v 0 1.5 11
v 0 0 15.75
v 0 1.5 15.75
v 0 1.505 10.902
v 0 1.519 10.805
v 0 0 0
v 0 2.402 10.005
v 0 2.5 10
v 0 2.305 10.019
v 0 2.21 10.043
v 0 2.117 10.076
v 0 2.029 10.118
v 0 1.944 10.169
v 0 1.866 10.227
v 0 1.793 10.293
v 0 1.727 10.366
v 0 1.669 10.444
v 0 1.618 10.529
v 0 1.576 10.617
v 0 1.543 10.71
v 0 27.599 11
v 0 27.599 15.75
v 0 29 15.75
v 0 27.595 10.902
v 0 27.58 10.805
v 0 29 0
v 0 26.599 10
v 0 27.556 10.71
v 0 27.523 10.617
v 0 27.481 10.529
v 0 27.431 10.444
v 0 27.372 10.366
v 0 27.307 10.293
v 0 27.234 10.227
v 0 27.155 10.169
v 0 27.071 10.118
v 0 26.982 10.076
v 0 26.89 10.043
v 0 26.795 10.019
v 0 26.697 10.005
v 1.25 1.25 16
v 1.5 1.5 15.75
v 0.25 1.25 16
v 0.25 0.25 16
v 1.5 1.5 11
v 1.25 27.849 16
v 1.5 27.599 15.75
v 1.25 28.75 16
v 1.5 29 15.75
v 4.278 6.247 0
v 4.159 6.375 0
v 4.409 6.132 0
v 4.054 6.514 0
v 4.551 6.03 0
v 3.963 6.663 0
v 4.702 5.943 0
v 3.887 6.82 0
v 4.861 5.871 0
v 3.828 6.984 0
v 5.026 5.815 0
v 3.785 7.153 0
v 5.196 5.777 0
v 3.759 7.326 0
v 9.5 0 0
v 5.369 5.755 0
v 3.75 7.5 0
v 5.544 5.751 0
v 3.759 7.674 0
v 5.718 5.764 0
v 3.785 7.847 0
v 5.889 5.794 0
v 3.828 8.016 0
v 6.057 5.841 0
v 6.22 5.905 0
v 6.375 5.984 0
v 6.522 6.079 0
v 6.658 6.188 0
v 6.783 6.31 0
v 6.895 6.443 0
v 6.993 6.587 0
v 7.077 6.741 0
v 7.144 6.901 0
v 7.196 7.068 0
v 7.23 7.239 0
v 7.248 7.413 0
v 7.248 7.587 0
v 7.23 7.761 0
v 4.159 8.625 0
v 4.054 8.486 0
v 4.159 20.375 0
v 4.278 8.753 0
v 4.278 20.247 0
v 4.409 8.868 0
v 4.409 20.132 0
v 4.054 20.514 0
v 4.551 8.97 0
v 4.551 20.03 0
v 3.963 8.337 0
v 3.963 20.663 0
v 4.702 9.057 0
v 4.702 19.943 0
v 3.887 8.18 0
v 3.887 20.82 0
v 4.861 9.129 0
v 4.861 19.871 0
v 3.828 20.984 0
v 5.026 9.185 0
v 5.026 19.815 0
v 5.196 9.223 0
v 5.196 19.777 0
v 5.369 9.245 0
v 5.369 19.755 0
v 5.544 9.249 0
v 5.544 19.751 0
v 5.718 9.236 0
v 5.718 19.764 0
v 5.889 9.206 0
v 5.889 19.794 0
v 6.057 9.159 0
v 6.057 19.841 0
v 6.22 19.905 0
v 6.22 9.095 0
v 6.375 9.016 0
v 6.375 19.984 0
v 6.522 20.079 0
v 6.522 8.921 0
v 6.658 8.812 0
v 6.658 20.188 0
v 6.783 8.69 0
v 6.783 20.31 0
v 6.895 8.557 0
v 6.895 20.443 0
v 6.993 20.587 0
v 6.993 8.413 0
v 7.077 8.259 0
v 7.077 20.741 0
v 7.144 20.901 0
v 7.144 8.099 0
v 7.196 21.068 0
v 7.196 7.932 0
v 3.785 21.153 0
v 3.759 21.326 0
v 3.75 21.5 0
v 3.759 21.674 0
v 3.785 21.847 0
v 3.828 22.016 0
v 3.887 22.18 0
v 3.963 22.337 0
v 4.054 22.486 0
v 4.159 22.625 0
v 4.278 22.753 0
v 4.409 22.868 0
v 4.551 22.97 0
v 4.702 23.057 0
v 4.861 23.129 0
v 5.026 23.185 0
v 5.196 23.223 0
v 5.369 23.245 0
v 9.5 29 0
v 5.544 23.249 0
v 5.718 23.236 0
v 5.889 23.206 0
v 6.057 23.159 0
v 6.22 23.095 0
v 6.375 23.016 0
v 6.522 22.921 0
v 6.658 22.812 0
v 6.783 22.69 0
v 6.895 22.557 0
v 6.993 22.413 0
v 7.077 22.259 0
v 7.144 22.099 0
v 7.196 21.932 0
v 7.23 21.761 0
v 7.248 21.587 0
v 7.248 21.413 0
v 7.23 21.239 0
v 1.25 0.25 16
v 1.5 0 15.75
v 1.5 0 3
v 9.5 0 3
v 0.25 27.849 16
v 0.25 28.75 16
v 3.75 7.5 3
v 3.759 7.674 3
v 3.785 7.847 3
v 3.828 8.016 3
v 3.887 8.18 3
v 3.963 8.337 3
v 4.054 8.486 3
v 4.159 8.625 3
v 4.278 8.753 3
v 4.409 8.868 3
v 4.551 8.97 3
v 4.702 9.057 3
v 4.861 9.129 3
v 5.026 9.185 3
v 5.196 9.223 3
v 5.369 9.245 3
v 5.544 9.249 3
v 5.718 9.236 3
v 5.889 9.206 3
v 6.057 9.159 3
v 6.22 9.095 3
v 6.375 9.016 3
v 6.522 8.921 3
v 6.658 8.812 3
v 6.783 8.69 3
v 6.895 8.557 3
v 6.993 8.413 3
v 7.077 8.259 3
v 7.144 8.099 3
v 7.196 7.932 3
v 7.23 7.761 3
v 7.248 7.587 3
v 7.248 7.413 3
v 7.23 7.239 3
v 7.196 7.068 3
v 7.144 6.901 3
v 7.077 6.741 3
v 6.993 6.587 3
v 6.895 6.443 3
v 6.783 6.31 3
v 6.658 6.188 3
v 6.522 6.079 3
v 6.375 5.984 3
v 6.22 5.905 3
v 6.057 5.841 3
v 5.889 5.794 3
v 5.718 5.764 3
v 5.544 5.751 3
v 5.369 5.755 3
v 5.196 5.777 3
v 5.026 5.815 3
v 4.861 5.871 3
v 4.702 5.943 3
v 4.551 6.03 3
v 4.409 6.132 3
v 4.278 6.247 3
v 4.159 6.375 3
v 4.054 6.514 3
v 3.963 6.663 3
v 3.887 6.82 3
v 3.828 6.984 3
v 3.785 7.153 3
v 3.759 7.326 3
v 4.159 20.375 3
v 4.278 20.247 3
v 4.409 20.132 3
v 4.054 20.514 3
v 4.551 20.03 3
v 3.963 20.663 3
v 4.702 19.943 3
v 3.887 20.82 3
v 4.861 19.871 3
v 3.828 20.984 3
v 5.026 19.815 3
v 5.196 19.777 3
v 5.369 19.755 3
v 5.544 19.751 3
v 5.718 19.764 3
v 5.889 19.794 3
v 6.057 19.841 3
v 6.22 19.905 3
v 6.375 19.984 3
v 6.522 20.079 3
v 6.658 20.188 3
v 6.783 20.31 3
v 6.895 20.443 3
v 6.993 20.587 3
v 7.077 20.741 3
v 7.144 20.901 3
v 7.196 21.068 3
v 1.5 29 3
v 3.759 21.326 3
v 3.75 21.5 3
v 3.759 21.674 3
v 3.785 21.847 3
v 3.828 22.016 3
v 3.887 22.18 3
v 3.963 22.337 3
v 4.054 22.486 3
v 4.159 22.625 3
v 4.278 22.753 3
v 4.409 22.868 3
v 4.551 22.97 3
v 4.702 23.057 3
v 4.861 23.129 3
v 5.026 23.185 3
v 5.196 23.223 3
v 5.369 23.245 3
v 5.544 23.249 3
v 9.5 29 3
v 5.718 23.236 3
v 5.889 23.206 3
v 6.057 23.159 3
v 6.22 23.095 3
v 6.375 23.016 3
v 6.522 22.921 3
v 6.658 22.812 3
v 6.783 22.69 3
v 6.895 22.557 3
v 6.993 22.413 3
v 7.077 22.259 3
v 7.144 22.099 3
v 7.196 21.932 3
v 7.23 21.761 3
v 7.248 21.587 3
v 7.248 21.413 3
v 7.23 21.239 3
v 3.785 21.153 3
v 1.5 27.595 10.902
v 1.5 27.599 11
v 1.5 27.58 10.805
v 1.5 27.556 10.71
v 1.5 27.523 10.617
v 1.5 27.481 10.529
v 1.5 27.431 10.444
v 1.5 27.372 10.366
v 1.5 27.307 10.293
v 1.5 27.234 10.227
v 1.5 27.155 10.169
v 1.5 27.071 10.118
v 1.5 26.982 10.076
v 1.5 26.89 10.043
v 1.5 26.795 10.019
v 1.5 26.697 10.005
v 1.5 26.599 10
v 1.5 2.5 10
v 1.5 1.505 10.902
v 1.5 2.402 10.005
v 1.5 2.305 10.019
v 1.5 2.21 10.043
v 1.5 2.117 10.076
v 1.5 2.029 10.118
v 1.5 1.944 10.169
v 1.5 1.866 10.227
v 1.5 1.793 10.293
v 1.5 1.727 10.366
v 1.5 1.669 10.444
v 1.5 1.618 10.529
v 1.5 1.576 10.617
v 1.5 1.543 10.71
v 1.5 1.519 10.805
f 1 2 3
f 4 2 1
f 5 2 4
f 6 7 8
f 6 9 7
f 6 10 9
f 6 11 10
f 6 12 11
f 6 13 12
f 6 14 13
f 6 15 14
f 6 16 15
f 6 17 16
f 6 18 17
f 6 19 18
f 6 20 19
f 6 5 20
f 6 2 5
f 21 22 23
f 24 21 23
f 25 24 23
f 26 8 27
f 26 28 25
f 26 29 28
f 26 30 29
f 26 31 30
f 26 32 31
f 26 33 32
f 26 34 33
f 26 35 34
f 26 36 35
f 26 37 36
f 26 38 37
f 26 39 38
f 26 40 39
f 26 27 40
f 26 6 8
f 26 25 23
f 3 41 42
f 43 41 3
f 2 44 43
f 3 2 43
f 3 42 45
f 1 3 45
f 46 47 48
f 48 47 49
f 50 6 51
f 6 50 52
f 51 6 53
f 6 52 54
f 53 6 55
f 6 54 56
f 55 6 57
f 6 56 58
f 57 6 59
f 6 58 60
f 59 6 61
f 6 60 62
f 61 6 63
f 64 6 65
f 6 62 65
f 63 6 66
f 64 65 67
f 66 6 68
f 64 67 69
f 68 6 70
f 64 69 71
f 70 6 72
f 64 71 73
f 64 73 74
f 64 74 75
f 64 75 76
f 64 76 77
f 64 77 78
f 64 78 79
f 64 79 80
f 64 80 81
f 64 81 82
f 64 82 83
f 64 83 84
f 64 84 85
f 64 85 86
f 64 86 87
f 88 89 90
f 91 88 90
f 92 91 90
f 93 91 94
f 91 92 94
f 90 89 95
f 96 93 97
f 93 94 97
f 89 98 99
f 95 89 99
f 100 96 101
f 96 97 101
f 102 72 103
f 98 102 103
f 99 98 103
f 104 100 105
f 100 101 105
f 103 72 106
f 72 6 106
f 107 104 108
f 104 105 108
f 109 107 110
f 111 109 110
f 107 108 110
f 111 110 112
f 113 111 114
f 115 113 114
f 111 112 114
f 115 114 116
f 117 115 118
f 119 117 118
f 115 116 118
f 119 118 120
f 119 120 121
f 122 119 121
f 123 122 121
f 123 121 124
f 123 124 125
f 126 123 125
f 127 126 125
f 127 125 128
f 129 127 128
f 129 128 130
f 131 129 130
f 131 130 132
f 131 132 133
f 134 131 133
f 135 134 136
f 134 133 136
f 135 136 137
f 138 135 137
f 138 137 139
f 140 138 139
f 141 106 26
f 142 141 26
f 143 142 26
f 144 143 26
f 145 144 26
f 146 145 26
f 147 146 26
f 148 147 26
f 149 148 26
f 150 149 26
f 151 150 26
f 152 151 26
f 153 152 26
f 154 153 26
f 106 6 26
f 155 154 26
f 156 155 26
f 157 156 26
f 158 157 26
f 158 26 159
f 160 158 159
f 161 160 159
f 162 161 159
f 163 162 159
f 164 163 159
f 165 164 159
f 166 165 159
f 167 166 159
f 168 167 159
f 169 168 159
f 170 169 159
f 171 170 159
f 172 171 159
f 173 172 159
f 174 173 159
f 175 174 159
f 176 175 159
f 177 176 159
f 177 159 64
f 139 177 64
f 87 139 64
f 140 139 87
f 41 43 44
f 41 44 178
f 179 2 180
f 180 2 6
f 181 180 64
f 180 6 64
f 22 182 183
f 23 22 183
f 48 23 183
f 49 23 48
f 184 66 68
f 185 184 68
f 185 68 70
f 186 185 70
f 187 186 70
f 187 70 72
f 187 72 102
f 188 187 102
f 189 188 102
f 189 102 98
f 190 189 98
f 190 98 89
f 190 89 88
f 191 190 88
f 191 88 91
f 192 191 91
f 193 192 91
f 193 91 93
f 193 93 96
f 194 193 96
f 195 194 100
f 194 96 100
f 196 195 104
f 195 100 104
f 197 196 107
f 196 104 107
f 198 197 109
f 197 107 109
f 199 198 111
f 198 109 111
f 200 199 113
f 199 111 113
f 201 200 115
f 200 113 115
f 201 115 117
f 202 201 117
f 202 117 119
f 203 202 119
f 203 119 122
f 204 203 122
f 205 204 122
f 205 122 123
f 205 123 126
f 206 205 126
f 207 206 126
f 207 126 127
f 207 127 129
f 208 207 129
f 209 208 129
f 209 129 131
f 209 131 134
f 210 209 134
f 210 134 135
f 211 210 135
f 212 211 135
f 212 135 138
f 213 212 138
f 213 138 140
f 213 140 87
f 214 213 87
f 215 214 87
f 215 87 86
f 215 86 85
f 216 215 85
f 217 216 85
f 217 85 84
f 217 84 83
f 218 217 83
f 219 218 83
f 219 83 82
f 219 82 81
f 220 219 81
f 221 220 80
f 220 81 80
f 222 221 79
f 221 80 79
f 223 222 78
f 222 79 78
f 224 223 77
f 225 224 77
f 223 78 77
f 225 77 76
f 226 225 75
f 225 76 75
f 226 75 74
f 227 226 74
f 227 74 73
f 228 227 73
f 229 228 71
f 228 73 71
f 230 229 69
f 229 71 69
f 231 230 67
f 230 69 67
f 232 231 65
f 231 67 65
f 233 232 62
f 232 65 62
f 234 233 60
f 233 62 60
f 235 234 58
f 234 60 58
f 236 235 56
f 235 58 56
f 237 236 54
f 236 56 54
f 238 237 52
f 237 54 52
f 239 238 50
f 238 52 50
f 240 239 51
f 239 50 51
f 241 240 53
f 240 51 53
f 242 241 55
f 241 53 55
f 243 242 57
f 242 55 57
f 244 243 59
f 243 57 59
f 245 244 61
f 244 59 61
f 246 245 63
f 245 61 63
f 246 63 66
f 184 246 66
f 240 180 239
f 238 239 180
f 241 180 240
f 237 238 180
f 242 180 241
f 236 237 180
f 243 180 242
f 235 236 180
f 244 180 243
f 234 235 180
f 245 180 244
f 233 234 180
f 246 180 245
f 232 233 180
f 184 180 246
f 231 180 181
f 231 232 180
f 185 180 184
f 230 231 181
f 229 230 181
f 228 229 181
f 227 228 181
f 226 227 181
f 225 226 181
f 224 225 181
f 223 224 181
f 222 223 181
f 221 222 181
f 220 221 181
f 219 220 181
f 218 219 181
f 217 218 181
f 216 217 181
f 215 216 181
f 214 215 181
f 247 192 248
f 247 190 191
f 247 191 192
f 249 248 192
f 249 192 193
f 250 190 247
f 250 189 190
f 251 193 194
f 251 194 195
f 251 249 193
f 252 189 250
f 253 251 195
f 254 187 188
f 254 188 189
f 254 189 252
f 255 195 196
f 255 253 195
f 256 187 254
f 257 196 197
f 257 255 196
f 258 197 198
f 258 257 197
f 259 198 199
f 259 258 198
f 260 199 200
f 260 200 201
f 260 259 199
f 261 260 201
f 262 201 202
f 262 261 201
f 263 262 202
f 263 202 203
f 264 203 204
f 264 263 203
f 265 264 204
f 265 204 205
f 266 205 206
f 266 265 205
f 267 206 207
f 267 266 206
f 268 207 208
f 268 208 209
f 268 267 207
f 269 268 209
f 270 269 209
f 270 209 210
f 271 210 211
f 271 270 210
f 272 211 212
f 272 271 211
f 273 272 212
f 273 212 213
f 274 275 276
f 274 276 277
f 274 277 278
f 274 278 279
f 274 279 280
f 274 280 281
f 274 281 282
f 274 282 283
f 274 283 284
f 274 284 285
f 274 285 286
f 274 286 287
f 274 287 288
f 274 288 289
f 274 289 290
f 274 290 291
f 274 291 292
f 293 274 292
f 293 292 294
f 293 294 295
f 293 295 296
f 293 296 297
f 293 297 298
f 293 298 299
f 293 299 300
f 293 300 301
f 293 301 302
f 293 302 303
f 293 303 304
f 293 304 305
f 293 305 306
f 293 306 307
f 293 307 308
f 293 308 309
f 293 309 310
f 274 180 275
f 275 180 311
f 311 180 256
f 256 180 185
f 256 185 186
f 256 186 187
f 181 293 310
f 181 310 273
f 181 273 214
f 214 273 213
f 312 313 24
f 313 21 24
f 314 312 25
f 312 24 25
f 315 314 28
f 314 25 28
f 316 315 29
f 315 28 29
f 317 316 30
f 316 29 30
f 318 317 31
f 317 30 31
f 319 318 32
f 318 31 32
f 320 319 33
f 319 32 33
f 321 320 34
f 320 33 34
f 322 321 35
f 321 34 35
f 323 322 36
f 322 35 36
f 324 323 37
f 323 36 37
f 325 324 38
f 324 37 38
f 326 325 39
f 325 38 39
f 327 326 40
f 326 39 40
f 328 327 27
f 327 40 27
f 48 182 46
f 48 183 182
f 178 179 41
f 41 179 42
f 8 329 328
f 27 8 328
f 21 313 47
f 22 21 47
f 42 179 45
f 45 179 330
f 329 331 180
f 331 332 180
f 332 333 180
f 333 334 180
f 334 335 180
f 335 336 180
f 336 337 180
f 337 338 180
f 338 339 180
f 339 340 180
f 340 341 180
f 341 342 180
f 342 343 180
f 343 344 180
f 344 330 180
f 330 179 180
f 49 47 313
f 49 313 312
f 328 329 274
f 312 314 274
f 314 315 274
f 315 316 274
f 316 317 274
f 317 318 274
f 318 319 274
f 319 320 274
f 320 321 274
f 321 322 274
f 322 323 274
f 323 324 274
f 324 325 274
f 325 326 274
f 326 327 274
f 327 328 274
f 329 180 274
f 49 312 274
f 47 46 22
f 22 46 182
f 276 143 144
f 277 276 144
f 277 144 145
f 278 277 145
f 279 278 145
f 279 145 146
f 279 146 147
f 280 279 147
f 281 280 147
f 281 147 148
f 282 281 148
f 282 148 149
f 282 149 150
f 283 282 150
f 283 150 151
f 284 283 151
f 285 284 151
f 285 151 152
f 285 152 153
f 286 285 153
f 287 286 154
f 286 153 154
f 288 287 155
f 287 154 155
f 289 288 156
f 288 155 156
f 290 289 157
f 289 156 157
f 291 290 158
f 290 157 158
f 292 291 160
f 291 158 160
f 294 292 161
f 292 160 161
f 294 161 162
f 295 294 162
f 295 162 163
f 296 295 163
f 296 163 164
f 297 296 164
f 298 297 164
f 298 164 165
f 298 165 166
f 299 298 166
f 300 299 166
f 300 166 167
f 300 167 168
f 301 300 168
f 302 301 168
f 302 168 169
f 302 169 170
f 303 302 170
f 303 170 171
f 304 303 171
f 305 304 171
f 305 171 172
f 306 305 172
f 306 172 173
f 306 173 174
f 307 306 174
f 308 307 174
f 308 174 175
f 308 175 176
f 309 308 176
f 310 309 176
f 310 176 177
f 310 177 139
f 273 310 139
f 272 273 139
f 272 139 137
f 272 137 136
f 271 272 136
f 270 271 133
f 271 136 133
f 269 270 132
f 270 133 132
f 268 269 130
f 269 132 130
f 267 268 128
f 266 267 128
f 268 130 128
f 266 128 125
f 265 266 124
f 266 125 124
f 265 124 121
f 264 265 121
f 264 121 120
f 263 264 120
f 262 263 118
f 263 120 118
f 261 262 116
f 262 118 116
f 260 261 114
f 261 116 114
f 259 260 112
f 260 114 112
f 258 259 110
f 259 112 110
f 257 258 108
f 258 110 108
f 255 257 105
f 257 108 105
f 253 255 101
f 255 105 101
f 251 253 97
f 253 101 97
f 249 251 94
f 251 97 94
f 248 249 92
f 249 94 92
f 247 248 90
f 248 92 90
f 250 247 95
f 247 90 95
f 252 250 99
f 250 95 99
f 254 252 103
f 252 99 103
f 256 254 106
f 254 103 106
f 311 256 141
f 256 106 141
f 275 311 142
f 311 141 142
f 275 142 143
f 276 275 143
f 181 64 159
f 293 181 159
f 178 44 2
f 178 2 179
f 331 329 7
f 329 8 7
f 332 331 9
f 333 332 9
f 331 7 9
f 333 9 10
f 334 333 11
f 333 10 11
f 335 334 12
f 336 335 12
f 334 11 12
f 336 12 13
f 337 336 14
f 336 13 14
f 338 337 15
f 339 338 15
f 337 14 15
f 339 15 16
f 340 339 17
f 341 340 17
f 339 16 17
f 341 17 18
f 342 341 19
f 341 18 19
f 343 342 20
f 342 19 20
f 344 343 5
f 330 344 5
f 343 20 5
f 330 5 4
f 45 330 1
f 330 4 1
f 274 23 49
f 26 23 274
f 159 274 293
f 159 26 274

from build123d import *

# Parameters (mm, degrees)
F1_DEPTH = 3
F2_W     = 1.5
F2_H     = 29
F3_DEPTH = 13
F5_D     = 3.5
F7_DEPTH = 1.501
F8_R     = 1
F9_SIZE  = 0.25


with BuildPart() as f1:
    # F0 (on Top) → F1 (new body)
    with BuildSketch(Plane.XY):
        Polygon((0, 29), (0, 0), (9.5, 0), (9.5, 29), (1.5, 29), align=None)
    extrude(amount=F1_DEPTH)

    # F2 (on face) → F3 (join)
    with BuildSketch(Plane.XY.offset(3)):
        with Locations((0.75, 14.5)):
            Rectangle(F2_W, F2_H)
    extrude(amount=F3_DEPTH)

    # F5 (through all)
    with Locations(Plane.XY.offset(3)):
        with Locations((5.5, 21.5), (5.5, 7.5)):
            Hole(F5_D / 2)

    # F6 (on face) → F7 (cut, through all)
    with BuildSketch(Plane.YZ.offset(1.5)):
        Polygon((27.5, 16), (1.5, 16), (1.5, 10), (27.5994203985, 10), (27.5994203985, 16), align=None)
    extrude(amount=-F7_DEPTH, mode=Mode.SUBTRACT)

    # F8
    f8_edges = [f1.edges().sort_by_distance(p)[0] for p in [
        (0.75, 27.59942, 10),
        (0.75, 1.5, 10),
    ]]
    fillet(f8_edges, radius=F8_R)

    # F9
    f9_edges = [f1.edges().sort_by_distance(p)[0] for p in [
        (0.75, 27.59942, 16),
        (1.5, 28.29971, 16),
        (0.75, 29, 16),
        (0, 28.29971, 16),
        (0.75, 1.5, 16),
        (1.5, 0.75, 16),
        (0.75, 0, 16),
        (0, 0.75, 16),
    ]]
    chamfer(f9_edges, length=F9_SIZE)


solid = f1.part
